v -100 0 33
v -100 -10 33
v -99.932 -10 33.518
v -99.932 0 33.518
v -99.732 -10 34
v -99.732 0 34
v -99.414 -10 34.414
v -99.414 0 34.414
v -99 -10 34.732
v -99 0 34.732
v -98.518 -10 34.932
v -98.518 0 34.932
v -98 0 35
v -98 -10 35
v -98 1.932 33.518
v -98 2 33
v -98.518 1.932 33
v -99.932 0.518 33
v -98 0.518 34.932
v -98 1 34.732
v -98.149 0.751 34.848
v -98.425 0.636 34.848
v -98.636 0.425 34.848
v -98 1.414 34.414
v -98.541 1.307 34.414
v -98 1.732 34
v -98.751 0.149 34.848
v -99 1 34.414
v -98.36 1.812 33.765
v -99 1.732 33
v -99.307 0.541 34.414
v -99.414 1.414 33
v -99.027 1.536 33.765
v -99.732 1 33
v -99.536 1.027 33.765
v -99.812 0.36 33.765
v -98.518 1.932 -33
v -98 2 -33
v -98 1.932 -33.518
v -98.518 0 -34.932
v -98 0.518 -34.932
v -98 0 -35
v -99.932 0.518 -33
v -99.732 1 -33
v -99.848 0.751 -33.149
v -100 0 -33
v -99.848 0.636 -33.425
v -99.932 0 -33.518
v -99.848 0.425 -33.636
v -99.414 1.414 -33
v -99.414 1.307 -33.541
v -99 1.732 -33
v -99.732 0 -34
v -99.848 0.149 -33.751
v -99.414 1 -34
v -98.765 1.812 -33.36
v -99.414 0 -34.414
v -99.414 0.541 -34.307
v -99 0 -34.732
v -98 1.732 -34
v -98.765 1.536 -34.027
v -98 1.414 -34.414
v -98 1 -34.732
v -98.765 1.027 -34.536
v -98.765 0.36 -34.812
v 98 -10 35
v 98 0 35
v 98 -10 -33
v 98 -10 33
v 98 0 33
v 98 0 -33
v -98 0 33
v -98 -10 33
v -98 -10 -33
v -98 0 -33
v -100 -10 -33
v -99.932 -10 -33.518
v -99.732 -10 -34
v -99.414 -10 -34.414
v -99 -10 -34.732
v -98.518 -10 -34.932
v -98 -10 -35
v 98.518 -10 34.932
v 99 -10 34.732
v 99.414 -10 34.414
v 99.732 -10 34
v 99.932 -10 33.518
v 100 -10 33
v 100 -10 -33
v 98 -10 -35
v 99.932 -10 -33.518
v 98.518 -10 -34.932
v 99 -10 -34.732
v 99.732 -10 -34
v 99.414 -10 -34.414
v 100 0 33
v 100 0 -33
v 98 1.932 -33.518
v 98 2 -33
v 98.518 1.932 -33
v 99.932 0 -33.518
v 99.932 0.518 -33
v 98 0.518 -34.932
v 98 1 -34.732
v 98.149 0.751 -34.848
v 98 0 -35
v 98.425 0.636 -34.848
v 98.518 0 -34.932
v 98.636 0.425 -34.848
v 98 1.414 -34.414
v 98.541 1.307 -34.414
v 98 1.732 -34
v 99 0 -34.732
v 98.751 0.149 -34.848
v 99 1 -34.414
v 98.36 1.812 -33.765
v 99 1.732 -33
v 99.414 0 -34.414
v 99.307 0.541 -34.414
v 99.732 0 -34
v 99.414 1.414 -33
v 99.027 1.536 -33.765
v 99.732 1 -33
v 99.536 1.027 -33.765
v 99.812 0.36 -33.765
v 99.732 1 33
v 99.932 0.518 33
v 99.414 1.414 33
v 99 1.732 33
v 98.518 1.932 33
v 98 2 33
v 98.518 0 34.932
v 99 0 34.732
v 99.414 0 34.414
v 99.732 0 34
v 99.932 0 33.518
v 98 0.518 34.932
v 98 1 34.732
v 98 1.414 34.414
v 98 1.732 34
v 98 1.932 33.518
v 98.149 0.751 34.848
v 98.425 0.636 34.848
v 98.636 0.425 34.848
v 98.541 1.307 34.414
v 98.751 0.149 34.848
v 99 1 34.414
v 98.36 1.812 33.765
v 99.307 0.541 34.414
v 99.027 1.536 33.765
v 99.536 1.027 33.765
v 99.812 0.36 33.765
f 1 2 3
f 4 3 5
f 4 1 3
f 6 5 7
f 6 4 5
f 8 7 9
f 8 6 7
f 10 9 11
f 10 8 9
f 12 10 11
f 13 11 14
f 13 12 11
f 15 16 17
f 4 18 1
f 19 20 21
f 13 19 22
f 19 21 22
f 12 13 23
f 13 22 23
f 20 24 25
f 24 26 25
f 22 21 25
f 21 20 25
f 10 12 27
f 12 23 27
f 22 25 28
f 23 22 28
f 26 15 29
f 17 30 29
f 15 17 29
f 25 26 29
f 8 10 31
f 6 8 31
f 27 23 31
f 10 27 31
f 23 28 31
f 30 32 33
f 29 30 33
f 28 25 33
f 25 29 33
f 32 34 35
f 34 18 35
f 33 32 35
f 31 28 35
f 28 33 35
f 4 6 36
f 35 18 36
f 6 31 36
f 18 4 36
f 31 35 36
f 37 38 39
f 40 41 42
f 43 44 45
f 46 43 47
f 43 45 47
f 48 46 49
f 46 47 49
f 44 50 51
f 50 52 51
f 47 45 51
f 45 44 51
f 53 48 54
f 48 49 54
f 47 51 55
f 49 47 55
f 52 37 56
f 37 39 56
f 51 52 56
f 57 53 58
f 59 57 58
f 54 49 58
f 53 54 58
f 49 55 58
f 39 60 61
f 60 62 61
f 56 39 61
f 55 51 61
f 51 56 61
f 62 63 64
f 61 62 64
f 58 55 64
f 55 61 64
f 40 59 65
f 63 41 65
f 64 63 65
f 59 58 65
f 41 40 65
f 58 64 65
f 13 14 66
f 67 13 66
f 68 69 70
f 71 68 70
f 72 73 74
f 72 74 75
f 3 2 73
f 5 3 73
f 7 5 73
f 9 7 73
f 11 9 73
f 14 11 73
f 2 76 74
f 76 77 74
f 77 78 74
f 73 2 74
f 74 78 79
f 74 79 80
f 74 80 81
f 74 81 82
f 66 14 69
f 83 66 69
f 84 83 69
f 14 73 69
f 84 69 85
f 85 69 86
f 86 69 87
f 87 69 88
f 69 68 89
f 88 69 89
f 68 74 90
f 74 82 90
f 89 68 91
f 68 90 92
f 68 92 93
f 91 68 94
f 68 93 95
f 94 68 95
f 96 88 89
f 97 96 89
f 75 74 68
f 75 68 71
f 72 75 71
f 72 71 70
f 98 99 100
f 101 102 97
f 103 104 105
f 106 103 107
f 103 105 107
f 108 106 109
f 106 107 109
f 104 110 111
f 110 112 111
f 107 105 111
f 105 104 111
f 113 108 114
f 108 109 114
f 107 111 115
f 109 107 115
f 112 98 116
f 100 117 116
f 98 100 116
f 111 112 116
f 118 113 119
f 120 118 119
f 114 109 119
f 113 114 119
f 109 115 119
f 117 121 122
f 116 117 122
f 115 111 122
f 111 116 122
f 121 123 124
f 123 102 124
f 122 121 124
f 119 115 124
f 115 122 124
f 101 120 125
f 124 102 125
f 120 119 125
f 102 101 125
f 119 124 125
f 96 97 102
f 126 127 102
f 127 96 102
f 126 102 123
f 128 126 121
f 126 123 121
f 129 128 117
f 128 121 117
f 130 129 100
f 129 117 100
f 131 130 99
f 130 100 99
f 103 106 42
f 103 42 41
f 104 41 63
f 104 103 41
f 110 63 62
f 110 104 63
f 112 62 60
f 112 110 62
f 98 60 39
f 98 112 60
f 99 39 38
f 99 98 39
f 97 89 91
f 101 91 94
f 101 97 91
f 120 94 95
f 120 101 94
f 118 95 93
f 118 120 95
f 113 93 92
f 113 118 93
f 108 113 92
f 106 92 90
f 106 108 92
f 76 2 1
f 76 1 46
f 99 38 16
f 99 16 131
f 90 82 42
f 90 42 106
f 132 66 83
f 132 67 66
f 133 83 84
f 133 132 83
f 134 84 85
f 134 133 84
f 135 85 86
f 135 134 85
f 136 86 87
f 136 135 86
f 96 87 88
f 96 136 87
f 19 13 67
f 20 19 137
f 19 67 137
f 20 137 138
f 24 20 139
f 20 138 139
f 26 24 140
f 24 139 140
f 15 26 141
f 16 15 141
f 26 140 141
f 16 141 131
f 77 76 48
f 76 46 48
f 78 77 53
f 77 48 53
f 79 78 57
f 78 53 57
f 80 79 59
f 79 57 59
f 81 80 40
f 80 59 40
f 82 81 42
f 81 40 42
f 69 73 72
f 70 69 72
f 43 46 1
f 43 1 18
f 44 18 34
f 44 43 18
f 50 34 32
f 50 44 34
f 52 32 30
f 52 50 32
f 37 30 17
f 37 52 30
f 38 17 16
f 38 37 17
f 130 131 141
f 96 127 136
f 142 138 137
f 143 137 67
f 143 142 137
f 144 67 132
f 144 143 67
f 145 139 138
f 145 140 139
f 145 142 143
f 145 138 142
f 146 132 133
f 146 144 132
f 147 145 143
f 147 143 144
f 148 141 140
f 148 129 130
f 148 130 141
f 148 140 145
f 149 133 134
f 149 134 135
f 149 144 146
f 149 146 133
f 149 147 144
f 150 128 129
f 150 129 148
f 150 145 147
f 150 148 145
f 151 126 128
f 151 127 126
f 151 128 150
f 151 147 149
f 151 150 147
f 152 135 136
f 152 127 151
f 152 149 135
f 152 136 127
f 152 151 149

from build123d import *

# Parameters (mm, degrees)
RECTANGLEBOX_DEPTH      = 2
RECTANGLEBOX_DEPTH_BACK = 10
SKETCHREC_W             = 200
SKETCHREC_H             = 70
RECTANGLER_R            = 2
RECTANGLEC_START        = -98
RECTANGLEC_OUTLINE_W    = 10
RECTANGLEC_OUTLINE_H    = 66
RECTANGLEC_DEPTH        = 196


# Read off the part's stored shape, not the designer's step: RectangleC
with BuildPart() as part:
    # SketchRec → RectangleBox (new, two sides: drawn at the far end of the back side and taken through both)
    with BuildSketch(Plane(origin=(0, 0, 0), x_dir=(1, 0, 0), z_dir=(0, 1, 0)).offset(-RECTANGLEBOX_DEPTH_BACK)):
        Rectangle(SKETCHREC_W, SKETCHREC_H)
    extrude(amount=RECTANGLEBOX_DEPTH + RECTANGLEBOX_DEPTH_BACK)

    # RectangleR
    rectangler_edges = [part.edges().sort_by_distance(p)[0] for p in [
        (100, 2, 0),
        (0, 2, -35),
        (-100, 2, 0),
        (0, 2, 35),
        (100, -4, 35),
        (-100, -4, 35),
        (-100, -4, -35),
        (100, -4, -35),
    ]]
    fillet(rectangler_edges, radius=RECTANGLER_R)

    # RectangleC outline → RectangleC (cut)
    with BuildSketch(Plane.YZ.offset(RECTANGLEC_START)):
        with Locations((-5, 0)):
            Rectangle(RECTANGLEC_OUTLINE_W, RECTANGLEC_OUTLINE_H)
    extrude(amount=RECTANGLEC_DEPTH, mode=Mode.SUBTRACT)


solid = part.part
